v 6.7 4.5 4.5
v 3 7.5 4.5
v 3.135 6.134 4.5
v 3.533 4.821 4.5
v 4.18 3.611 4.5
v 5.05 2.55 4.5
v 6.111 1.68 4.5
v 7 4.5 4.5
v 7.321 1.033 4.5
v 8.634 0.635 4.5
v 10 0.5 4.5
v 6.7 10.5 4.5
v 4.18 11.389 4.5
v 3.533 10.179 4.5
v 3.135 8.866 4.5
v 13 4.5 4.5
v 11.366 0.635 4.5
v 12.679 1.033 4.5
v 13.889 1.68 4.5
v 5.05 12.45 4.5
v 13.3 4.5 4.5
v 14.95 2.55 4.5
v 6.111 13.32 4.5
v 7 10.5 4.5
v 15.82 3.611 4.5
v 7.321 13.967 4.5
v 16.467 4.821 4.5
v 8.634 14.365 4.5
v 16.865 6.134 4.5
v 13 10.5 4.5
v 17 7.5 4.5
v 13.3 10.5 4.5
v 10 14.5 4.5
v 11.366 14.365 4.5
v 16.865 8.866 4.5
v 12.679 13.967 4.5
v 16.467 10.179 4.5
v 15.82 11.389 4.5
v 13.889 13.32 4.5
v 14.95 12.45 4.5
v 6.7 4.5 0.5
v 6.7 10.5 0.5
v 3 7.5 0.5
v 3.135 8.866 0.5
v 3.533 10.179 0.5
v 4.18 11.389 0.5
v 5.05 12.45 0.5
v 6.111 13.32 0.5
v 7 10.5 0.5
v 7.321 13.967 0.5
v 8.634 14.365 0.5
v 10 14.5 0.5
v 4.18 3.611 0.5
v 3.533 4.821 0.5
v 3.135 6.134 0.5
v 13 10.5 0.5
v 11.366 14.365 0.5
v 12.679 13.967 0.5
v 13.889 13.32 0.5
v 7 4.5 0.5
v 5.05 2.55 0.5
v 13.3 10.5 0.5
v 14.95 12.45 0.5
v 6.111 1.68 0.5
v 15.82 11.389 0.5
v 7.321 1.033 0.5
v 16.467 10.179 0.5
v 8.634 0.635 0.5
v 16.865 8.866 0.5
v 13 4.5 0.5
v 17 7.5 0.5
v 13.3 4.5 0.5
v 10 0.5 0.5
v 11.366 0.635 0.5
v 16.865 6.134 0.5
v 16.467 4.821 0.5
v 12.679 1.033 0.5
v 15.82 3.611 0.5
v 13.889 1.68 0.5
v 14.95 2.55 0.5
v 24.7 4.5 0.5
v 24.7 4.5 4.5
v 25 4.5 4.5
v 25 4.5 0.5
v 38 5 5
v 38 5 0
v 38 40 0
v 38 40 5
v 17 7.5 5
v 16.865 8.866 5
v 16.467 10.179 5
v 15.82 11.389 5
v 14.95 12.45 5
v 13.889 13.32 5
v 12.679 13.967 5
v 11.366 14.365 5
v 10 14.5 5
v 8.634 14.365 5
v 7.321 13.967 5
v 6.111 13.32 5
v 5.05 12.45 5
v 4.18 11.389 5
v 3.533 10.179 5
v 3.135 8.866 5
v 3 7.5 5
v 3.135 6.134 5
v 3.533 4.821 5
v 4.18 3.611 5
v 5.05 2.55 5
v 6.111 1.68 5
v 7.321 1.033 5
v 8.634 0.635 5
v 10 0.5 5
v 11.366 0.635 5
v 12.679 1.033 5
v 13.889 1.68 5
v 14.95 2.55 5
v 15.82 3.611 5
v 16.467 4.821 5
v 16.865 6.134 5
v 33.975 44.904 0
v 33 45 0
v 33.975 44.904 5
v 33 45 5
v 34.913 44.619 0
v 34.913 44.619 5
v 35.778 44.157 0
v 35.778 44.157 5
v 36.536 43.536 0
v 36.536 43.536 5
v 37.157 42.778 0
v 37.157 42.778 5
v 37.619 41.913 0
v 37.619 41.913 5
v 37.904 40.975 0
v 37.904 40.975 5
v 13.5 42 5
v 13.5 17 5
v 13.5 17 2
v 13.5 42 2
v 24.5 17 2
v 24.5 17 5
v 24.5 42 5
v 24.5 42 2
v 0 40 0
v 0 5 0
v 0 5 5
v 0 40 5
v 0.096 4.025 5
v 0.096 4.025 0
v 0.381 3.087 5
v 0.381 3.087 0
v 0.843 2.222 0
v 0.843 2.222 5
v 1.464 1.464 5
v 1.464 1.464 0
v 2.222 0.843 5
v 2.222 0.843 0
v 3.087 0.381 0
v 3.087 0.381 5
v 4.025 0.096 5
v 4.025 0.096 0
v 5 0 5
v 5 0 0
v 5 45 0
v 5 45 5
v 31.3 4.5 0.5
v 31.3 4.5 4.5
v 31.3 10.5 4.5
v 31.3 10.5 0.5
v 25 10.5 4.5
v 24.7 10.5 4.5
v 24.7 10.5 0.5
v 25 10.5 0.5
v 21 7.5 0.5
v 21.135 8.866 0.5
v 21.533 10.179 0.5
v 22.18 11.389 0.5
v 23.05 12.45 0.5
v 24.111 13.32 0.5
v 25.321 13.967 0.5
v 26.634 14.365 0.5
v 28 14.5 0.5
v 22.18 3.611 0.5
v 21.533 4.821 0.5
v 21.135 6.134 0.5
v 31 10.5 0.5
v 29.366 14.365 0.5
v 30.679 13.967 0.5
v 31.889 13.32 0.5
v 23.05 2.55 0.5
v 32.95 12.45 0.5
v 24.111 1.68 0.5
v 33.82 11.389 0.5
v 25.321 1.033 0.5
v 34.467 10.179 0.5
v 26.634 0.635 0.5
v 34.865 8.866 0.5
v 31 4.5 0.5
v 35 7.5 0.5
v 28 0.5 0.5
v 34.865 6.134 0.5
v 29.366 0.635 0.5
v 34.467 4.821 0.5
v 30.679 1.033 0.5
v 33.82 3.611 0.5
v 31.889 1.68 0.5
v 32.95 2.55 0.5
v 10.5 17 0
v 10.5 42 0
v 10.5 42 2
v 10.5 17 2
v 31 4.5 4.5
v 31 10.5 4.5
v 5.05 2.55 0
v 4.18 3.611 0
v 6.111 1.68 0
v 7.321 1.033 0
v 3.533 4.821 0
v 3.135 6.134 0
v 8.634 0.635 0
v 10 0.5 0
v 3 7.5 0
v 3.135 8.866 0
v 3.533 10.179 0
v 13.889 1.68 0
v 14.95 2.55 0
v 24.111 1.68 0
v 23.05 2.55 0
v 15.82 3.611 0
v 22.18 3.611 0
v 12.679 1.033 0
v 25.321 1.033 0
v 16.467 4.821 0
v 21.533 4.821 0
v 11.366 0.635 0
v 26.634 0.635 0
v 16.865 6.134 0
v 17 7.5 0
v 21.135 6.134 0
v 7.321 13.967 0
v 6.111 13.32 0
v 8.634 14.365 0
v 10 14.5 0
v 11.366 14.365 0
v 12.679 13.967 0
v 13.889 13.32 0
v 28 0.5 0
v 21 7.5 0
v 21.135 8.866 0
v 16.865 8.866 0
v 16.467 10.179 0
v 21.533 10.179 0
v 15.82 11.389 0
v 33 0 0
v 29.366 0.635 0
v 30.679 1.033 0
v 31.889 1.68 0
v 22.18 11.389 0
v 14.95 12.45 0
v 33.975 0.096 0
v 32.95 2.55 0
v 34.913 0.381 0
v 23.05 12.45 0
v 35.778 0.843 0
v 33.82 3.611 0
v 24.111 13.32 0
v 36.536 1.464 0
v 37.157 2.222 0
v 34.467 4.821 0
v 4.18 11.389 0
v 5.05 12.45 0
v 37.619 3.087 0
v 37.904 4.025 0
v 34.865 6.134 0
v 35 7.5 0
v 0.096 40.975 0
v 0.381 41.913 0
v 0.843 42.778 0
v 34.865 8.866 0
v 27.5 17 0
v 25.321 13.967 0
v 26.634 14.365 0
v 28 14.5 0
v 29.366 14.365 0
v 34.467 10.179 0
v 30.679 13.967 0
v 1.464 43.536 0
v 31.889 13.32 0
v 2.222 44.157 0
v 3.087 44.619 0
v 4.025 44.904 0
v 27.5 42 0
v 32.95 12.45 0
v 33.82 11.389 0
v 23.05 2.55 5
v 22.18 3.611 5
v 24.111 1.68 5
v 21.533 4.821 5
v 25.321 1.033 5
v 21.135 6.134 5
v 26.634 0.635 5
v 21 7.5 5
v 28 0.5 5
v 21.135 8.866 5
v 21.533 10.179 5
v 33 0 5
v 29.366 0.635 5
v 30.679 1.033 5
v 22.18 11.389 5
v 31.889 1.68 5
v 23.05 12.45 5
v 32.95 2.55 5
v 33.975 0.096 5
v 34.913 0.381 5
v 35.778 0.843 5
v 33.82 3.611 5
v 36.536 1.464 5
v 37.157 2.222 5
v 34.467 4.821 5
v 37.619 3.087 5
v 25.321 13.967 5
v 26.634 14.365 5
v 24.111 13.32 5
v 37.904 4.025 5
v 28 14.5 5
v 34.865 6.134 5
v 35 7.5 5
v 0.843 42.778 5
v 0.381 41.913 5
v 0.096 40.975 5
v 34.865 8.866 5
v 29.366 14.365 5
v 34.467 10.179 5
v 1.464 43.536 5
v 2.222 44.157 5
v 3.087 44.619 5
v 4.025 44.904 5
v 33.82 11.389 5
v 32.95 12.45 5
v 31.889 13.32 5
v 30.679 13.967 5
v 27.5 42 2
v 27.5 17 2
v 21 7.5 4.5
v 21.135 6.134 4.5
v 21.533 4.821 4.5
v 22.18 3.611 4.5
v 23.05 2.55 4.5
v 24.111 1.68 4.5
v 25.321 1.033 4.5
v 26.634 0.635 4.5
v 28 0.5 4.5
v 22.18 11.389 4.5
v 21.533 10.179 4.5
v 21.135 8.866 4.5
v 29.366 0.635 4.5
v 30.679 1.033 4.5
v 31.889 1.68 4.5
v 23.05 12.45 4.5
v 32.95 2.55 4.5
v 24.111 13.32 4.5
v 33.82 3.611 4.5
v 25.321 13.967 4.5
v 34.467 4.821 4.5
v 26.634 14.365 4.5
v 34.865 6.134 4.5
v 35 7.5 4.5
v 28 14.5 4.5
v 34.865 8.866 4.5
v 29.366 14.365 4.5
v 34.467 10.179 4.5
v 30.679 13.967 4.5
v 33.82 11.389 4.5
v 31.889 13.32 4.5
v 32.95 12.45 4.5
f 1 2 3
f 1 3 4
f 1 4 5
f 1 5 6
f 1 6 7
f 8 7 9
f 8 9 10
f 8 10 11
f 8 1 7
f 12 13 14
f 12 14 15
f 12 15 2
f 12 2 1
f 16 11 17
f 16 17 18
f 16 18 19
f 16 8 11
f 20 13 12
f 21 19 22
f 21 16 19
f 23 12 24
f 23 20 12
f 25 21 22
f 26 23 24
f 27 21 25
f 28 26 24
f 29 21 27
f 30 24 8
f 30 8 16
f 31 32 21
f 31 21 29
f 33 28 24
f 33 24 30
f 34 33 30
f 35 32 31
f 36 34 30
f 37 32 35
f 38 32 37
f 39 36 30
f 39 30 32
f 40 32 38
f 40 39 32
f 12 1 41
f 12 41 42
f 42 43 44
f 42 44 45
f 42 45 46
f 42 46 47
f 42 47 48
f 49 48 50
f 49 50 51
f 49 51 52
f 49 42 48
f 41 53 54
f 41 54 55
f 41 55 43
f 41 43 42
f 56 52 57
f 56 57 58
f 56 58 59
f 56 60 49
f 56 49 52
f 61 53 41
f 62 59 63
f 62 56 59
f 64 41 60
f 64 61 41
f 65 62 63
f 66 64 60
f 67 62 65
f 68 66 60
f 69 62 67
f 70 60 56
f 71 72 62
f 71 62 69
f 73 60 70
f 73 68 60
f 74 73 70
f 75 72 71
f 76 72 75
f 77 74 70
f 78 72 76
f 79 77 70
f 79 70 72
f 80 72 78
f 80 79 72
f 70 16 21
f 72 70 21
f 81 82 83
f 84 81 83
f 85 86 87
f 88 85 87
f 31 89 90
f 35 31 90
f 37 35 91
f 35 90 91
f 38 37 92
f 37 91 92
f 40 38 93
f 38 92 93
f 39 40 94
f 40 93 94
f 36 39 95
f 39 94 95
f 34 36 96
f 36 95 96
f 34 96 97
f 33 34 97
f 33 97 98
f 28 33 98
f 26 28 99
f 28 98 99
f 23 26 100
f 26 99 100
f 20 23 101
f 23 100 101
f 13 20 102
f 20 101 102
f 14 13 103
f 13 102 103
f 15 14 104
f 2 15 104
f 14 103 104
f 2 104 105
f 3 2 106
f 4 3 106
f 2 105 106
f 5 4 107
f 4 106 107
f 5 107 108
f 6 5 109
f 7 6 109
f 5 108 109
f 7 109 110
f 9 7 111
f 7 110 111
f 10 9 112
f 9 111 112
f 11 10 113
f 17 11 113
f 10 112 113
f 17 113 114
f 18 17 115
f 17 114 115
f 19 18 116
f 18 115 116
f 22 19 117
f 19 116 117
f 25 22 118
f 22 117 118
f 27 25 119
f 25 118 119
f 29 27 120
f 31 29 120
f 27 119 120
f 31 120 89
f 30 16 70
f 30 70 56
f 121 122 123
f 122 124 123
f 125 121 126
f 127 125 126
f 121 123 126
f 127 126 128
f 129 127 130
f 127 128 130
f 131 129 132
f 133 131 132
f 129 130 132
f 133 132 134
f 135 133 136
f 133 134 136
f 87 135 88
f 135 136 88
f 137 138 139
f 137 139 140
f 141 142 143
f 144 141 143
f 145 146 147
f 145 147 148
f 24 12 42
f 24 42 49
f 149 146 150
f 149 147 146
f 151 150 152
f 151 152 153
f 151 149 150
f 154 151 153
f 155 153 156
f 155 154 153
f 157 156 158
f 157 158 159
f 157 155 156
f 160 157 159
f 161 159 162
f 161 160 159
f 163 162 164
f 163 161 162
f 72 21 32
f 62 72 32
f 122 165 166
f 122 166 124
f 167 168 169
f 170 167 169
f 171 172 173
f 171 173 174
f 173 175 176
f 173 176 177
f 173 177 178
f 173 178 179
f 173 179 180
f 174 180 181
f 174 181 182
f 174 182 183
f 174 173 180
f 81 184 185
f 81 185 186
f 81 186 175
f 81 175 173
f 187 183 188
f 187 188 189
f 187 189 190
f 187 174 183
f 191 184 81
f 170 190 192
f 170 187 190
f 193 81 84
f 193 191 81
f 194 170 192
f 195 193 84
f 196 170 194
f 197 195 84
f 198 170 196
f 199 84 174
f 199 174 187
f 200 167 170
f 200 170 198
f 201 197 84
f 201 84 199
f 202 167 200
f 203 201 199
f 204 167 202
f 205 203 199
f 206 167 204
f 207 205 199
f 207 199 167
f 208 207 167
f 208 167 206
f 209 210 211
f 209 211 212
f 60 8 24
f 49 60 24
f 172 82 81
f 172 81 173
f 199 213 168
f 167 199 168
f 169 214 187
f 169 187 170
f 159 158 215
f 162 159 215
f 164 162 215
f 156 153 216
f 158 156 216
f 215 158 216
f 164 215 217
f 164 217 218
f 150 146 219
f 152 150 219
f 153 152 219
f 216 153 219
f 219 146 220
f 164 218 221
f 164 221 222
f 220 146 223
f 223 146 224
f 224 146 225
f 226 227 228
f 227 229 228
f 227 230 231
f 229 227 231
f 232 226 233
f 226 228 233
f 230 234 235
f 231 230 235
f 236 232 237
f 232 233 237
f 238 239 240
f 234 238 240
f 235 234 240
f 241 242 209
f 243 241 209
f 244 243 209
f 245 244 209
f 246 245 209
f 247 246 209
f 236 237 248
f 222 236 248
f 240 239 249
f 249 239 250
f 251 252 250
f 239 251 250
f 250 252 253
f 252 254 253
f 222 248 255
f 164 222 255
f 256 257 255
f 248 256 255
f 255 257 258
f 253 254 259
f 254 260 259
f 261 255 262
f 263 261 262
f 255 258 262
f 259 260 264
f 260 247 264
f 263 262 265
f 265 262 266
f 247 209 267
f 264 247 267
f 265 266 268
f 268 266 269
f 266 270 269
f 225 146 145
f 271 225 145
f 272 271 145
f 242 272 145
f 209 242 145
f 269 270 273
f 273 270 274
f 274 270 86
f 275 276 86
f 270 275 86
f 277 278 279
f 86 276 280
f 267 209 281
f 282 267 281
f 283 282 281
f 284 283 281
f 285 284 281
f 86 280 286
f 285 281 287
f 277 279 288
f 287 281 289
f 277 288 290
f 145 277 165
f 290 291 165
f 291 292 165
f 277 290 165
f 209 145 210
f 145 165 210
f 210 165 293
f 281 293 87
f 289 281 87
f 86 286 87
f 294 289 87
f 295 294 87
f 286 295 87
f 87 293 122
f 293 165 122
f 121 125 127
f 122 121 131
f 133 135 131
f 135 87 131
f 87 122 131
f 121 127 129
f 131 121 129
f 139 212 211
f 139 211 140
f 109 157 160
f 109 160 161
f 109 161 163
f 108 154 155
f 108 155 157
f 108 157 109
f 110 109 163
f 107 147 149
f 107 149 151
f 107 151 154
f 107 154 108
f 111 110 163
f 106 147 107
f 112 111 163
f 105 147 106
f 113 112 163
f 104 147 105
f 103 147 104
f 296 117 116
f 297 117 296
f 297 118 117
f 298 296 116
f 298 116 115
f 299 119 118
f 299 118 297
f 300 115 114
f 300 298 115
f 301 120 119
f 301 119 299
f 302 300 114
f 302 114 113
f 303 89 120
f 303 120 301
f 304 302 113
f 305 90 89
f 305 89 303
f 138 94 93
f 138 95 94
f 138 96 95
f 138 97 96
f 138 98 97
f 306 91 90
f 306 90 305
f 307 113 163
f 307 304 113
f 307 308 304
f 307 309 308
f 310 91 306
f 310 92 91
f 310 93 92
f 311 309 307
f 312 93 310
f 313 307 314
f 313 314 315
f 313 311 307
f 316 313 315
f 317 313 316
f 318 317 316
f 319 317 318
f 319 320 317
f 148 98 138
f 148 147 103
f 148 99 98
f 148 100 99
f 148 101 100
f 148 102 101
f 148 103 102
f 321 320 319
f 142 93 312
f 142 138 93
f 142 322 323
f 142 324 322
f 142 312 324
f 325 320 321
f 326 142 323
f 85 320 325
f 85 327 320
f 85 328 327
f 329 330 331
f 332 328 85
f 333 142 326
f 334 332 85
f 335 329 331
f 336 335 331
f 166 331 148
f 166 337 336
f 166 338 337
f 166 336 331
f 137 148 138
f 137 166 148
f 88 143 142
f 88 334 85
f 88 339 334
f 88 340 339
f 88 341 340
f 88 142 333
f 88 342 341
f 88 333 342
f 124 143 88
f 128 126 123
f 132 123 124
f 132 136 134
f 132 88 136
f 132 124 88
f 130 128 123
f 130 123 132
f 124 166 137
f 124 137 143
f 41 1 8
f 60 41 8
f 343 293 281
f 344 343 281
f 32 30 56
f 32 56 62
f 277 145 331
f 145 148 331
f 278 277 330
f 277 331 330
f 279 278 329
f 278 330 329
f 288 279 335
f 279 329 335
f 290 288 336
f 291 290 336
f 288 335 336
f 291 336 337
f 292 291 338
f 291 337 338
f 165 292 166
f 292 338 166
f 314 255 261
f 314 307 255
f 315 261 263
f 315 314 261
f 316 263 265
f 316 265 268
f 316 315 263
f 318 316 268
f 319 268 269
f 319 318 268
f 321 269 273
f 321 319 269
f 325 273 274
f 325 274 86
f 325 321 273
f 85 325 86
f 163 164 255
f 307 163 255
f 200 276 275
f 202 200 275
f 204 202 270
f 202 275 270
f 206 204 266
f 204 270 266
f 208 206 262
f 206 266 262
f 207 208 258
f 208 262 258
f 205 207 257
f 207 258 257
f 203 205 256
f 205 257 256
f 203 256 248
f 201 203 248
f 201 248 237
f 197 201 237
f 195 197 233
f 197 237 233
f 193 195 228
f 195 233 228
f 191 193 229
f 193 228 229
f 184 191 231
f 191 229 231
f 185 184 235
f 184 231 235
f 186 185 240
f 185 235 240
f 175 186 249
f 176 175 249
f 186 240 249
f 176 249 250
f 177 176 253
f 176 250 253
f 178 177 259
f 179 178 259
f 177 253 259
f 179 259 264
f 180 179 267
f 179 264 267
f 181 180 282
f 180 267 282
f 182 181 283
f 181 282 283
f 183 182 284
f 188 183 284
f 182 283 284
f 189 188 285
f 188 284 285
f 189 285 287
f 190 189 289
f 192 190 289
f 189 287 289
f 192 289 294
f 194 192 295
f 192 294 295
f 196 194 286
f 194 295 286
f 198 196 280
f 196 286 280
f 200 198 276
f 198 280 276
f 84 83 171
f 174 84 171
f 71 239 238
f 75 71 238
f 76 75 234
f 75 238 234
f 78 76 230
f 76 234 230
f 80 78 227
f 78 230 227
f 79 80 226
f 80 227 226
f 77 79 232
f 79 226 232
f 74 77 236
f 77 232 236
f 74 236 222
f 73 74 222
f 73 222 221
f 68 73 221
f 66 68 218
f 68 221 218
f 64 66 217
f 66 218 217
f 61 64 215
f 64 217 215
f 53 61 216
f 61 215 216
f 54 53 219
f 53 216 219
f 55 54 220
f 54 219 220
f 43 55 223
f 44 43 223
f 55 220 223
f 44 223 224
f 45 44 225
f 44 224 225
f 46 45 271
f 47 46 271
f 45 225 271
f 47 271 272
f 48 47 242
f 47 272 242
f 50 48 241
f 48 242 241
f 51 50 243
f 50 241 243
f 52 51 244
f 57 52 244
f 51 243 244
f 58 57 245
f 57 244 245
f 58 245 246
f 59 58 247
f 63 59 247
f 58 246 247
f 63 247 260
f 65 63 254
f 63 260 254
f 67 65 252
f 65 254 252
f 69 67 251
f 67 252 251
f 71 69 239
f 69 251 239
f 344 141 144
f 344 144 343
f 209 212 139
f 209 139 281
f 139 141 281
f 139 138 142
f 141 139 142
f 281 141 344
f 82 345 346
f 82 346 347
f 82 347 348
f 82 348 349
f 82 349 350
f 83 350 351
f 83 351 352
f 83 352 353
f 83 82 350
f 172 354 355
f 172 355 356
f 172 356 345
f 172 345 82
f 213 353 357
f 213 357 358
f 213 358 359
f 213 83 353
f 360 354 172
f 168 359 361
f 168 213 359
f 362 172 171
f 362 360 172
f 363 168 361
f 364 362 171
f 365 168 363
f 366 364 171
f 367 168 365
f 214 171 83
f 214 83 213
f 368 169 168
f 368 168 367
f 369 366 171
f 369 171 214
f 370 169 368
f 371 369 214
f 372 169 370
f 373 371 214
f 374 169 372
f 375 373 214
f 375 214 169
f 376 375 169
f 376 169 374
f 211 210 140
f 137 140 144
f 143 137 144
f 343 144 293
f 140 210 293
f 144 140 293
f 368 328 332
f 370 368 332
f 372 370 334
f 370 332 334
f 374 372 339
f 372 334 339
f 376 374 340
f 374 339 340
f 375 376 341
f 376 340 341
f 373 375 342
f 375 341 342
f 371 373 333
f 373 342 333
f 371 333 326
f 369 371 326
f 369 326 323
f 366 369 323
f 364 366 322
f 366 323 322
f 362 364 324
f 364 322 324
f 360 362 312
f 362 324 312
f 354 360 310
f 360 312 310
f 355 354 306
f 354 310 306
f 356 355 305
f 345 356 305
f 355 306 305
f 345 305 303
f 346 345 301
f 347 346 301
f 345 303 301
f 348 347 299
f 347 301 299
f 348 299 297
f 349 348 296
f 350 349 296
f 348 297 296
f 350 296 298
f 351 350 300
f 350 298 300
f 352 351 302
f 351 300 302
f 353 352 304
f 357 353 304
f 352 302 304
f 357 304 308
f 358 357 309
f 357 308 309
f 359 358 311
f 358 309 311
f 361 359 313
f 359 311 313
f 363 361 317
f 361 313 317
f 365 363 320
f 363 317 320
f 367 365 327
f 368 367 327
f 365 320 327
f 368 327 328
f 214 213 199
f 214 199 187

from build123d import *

# Parameters (mm, degrees)
F0_W      = 38
F0_H      = 45
F1_DEPTH  = 5
F2_R      = 7
F3_DEPTH  = 0.5
F2_W      = 5.5
F2_H      = 25
F4_DEPTH  = 5.001
F5_W      = 3
F5_H      = 25
F6_DEPTH  = 2
F7_W      = 0.3
F7_H      = 6
F8_DEPTH  = 5
F9_R      = 7
F10_DEPTH = 0.5
F11_R     = 5


with BuildPart() as f1:
    # F0 (on Top) → F1 (new body)
    with BuildSketch(Plane.XY):
        with Locations((19, 22.5)):
            Rectangle(F0_W, F0_H)
    extrude(amount=F1_DEPTH)

    # F2 (on face) → F3 (cut)
    with BuildSketch(Plane.XY.offset(5)):
        with Locations((10, 7.5)):
            Circle(F2_R)
        with Locations((28, 7.5)):
            Circle(F2_R)
    extrude(amount=-F3_DEPTH, mode=Mode.SUBTRACT)

    # F2 (on face) → F4 (cut, through all)
    with BuildSketch(Plane.XY.offset(5)):
        with Locations((16.25, 29.5)):
            Rectangle(F2_W, F2_H)
        with Locations((21.75, 29.5)):
            Rectangle(F2_W, F2_H)
    extrude(amount=-F4_DEPTH, mode=Mode.SUBTRACT)

    # F5 (on face) → F6 (cut)
    with BuildSketch(Plane(origin=(0, 0, 0), x_dir=(1, 0, 0), z_dir=(0, 0, -1))):
        with Locations((26, -29.5)):
            Rectangle(F5_W, F5_H)
        with Locations((12, -29.5)):
            Rectangle(F5_W, F5_H)
    extrude(amount=-F6_DEPTH, mode=Mode.SUBTRACT)

    # F7 (on face) → F8 (cut)
    with BuildSketch(Plane.XY.offset(4.5)):
        with Locations((6.85, 7.5)):
            Rectangle(F7_W, F7_H)
        with Locations((13.15, 7.5)):
            Rectangle(F7_W, F7_H)
        with Locations((24.85, 7.5)):
            Rectangle(F7_W, F7_H)
        with Locations((31.15, 7.5)):
            Rectangle(F7_W, F7_H)
    extrude(amount=-F8_DEPTH, mode=Mode.SUBTRACT)

    # F9 (on face) → F10 (cut)
    with BuildSketch(Plane(origin=(0, 0, 0), x_dir=(1, 0, 0), z_dir=(0, 0, -1))):
        with Locations((28, -7.5)):
            Circle(F9_R)
        with Locations((10, -7.5)):
            Circle(F9_R)
    extrude(amount=-F10_DEPTH, mode=Mode.SUBTRACT)

    # F11
    f11_edges = [f1.edges().sort_by_distance(p)[0] for p in [
        (0, 0, 2.5),
        (38, 0, 2.5),
        (38, 45, 2.5),
        (0, 45, 2.5),
    ]]
    fillet(f11_edges, radius=F11_R)


solid = f1.part
